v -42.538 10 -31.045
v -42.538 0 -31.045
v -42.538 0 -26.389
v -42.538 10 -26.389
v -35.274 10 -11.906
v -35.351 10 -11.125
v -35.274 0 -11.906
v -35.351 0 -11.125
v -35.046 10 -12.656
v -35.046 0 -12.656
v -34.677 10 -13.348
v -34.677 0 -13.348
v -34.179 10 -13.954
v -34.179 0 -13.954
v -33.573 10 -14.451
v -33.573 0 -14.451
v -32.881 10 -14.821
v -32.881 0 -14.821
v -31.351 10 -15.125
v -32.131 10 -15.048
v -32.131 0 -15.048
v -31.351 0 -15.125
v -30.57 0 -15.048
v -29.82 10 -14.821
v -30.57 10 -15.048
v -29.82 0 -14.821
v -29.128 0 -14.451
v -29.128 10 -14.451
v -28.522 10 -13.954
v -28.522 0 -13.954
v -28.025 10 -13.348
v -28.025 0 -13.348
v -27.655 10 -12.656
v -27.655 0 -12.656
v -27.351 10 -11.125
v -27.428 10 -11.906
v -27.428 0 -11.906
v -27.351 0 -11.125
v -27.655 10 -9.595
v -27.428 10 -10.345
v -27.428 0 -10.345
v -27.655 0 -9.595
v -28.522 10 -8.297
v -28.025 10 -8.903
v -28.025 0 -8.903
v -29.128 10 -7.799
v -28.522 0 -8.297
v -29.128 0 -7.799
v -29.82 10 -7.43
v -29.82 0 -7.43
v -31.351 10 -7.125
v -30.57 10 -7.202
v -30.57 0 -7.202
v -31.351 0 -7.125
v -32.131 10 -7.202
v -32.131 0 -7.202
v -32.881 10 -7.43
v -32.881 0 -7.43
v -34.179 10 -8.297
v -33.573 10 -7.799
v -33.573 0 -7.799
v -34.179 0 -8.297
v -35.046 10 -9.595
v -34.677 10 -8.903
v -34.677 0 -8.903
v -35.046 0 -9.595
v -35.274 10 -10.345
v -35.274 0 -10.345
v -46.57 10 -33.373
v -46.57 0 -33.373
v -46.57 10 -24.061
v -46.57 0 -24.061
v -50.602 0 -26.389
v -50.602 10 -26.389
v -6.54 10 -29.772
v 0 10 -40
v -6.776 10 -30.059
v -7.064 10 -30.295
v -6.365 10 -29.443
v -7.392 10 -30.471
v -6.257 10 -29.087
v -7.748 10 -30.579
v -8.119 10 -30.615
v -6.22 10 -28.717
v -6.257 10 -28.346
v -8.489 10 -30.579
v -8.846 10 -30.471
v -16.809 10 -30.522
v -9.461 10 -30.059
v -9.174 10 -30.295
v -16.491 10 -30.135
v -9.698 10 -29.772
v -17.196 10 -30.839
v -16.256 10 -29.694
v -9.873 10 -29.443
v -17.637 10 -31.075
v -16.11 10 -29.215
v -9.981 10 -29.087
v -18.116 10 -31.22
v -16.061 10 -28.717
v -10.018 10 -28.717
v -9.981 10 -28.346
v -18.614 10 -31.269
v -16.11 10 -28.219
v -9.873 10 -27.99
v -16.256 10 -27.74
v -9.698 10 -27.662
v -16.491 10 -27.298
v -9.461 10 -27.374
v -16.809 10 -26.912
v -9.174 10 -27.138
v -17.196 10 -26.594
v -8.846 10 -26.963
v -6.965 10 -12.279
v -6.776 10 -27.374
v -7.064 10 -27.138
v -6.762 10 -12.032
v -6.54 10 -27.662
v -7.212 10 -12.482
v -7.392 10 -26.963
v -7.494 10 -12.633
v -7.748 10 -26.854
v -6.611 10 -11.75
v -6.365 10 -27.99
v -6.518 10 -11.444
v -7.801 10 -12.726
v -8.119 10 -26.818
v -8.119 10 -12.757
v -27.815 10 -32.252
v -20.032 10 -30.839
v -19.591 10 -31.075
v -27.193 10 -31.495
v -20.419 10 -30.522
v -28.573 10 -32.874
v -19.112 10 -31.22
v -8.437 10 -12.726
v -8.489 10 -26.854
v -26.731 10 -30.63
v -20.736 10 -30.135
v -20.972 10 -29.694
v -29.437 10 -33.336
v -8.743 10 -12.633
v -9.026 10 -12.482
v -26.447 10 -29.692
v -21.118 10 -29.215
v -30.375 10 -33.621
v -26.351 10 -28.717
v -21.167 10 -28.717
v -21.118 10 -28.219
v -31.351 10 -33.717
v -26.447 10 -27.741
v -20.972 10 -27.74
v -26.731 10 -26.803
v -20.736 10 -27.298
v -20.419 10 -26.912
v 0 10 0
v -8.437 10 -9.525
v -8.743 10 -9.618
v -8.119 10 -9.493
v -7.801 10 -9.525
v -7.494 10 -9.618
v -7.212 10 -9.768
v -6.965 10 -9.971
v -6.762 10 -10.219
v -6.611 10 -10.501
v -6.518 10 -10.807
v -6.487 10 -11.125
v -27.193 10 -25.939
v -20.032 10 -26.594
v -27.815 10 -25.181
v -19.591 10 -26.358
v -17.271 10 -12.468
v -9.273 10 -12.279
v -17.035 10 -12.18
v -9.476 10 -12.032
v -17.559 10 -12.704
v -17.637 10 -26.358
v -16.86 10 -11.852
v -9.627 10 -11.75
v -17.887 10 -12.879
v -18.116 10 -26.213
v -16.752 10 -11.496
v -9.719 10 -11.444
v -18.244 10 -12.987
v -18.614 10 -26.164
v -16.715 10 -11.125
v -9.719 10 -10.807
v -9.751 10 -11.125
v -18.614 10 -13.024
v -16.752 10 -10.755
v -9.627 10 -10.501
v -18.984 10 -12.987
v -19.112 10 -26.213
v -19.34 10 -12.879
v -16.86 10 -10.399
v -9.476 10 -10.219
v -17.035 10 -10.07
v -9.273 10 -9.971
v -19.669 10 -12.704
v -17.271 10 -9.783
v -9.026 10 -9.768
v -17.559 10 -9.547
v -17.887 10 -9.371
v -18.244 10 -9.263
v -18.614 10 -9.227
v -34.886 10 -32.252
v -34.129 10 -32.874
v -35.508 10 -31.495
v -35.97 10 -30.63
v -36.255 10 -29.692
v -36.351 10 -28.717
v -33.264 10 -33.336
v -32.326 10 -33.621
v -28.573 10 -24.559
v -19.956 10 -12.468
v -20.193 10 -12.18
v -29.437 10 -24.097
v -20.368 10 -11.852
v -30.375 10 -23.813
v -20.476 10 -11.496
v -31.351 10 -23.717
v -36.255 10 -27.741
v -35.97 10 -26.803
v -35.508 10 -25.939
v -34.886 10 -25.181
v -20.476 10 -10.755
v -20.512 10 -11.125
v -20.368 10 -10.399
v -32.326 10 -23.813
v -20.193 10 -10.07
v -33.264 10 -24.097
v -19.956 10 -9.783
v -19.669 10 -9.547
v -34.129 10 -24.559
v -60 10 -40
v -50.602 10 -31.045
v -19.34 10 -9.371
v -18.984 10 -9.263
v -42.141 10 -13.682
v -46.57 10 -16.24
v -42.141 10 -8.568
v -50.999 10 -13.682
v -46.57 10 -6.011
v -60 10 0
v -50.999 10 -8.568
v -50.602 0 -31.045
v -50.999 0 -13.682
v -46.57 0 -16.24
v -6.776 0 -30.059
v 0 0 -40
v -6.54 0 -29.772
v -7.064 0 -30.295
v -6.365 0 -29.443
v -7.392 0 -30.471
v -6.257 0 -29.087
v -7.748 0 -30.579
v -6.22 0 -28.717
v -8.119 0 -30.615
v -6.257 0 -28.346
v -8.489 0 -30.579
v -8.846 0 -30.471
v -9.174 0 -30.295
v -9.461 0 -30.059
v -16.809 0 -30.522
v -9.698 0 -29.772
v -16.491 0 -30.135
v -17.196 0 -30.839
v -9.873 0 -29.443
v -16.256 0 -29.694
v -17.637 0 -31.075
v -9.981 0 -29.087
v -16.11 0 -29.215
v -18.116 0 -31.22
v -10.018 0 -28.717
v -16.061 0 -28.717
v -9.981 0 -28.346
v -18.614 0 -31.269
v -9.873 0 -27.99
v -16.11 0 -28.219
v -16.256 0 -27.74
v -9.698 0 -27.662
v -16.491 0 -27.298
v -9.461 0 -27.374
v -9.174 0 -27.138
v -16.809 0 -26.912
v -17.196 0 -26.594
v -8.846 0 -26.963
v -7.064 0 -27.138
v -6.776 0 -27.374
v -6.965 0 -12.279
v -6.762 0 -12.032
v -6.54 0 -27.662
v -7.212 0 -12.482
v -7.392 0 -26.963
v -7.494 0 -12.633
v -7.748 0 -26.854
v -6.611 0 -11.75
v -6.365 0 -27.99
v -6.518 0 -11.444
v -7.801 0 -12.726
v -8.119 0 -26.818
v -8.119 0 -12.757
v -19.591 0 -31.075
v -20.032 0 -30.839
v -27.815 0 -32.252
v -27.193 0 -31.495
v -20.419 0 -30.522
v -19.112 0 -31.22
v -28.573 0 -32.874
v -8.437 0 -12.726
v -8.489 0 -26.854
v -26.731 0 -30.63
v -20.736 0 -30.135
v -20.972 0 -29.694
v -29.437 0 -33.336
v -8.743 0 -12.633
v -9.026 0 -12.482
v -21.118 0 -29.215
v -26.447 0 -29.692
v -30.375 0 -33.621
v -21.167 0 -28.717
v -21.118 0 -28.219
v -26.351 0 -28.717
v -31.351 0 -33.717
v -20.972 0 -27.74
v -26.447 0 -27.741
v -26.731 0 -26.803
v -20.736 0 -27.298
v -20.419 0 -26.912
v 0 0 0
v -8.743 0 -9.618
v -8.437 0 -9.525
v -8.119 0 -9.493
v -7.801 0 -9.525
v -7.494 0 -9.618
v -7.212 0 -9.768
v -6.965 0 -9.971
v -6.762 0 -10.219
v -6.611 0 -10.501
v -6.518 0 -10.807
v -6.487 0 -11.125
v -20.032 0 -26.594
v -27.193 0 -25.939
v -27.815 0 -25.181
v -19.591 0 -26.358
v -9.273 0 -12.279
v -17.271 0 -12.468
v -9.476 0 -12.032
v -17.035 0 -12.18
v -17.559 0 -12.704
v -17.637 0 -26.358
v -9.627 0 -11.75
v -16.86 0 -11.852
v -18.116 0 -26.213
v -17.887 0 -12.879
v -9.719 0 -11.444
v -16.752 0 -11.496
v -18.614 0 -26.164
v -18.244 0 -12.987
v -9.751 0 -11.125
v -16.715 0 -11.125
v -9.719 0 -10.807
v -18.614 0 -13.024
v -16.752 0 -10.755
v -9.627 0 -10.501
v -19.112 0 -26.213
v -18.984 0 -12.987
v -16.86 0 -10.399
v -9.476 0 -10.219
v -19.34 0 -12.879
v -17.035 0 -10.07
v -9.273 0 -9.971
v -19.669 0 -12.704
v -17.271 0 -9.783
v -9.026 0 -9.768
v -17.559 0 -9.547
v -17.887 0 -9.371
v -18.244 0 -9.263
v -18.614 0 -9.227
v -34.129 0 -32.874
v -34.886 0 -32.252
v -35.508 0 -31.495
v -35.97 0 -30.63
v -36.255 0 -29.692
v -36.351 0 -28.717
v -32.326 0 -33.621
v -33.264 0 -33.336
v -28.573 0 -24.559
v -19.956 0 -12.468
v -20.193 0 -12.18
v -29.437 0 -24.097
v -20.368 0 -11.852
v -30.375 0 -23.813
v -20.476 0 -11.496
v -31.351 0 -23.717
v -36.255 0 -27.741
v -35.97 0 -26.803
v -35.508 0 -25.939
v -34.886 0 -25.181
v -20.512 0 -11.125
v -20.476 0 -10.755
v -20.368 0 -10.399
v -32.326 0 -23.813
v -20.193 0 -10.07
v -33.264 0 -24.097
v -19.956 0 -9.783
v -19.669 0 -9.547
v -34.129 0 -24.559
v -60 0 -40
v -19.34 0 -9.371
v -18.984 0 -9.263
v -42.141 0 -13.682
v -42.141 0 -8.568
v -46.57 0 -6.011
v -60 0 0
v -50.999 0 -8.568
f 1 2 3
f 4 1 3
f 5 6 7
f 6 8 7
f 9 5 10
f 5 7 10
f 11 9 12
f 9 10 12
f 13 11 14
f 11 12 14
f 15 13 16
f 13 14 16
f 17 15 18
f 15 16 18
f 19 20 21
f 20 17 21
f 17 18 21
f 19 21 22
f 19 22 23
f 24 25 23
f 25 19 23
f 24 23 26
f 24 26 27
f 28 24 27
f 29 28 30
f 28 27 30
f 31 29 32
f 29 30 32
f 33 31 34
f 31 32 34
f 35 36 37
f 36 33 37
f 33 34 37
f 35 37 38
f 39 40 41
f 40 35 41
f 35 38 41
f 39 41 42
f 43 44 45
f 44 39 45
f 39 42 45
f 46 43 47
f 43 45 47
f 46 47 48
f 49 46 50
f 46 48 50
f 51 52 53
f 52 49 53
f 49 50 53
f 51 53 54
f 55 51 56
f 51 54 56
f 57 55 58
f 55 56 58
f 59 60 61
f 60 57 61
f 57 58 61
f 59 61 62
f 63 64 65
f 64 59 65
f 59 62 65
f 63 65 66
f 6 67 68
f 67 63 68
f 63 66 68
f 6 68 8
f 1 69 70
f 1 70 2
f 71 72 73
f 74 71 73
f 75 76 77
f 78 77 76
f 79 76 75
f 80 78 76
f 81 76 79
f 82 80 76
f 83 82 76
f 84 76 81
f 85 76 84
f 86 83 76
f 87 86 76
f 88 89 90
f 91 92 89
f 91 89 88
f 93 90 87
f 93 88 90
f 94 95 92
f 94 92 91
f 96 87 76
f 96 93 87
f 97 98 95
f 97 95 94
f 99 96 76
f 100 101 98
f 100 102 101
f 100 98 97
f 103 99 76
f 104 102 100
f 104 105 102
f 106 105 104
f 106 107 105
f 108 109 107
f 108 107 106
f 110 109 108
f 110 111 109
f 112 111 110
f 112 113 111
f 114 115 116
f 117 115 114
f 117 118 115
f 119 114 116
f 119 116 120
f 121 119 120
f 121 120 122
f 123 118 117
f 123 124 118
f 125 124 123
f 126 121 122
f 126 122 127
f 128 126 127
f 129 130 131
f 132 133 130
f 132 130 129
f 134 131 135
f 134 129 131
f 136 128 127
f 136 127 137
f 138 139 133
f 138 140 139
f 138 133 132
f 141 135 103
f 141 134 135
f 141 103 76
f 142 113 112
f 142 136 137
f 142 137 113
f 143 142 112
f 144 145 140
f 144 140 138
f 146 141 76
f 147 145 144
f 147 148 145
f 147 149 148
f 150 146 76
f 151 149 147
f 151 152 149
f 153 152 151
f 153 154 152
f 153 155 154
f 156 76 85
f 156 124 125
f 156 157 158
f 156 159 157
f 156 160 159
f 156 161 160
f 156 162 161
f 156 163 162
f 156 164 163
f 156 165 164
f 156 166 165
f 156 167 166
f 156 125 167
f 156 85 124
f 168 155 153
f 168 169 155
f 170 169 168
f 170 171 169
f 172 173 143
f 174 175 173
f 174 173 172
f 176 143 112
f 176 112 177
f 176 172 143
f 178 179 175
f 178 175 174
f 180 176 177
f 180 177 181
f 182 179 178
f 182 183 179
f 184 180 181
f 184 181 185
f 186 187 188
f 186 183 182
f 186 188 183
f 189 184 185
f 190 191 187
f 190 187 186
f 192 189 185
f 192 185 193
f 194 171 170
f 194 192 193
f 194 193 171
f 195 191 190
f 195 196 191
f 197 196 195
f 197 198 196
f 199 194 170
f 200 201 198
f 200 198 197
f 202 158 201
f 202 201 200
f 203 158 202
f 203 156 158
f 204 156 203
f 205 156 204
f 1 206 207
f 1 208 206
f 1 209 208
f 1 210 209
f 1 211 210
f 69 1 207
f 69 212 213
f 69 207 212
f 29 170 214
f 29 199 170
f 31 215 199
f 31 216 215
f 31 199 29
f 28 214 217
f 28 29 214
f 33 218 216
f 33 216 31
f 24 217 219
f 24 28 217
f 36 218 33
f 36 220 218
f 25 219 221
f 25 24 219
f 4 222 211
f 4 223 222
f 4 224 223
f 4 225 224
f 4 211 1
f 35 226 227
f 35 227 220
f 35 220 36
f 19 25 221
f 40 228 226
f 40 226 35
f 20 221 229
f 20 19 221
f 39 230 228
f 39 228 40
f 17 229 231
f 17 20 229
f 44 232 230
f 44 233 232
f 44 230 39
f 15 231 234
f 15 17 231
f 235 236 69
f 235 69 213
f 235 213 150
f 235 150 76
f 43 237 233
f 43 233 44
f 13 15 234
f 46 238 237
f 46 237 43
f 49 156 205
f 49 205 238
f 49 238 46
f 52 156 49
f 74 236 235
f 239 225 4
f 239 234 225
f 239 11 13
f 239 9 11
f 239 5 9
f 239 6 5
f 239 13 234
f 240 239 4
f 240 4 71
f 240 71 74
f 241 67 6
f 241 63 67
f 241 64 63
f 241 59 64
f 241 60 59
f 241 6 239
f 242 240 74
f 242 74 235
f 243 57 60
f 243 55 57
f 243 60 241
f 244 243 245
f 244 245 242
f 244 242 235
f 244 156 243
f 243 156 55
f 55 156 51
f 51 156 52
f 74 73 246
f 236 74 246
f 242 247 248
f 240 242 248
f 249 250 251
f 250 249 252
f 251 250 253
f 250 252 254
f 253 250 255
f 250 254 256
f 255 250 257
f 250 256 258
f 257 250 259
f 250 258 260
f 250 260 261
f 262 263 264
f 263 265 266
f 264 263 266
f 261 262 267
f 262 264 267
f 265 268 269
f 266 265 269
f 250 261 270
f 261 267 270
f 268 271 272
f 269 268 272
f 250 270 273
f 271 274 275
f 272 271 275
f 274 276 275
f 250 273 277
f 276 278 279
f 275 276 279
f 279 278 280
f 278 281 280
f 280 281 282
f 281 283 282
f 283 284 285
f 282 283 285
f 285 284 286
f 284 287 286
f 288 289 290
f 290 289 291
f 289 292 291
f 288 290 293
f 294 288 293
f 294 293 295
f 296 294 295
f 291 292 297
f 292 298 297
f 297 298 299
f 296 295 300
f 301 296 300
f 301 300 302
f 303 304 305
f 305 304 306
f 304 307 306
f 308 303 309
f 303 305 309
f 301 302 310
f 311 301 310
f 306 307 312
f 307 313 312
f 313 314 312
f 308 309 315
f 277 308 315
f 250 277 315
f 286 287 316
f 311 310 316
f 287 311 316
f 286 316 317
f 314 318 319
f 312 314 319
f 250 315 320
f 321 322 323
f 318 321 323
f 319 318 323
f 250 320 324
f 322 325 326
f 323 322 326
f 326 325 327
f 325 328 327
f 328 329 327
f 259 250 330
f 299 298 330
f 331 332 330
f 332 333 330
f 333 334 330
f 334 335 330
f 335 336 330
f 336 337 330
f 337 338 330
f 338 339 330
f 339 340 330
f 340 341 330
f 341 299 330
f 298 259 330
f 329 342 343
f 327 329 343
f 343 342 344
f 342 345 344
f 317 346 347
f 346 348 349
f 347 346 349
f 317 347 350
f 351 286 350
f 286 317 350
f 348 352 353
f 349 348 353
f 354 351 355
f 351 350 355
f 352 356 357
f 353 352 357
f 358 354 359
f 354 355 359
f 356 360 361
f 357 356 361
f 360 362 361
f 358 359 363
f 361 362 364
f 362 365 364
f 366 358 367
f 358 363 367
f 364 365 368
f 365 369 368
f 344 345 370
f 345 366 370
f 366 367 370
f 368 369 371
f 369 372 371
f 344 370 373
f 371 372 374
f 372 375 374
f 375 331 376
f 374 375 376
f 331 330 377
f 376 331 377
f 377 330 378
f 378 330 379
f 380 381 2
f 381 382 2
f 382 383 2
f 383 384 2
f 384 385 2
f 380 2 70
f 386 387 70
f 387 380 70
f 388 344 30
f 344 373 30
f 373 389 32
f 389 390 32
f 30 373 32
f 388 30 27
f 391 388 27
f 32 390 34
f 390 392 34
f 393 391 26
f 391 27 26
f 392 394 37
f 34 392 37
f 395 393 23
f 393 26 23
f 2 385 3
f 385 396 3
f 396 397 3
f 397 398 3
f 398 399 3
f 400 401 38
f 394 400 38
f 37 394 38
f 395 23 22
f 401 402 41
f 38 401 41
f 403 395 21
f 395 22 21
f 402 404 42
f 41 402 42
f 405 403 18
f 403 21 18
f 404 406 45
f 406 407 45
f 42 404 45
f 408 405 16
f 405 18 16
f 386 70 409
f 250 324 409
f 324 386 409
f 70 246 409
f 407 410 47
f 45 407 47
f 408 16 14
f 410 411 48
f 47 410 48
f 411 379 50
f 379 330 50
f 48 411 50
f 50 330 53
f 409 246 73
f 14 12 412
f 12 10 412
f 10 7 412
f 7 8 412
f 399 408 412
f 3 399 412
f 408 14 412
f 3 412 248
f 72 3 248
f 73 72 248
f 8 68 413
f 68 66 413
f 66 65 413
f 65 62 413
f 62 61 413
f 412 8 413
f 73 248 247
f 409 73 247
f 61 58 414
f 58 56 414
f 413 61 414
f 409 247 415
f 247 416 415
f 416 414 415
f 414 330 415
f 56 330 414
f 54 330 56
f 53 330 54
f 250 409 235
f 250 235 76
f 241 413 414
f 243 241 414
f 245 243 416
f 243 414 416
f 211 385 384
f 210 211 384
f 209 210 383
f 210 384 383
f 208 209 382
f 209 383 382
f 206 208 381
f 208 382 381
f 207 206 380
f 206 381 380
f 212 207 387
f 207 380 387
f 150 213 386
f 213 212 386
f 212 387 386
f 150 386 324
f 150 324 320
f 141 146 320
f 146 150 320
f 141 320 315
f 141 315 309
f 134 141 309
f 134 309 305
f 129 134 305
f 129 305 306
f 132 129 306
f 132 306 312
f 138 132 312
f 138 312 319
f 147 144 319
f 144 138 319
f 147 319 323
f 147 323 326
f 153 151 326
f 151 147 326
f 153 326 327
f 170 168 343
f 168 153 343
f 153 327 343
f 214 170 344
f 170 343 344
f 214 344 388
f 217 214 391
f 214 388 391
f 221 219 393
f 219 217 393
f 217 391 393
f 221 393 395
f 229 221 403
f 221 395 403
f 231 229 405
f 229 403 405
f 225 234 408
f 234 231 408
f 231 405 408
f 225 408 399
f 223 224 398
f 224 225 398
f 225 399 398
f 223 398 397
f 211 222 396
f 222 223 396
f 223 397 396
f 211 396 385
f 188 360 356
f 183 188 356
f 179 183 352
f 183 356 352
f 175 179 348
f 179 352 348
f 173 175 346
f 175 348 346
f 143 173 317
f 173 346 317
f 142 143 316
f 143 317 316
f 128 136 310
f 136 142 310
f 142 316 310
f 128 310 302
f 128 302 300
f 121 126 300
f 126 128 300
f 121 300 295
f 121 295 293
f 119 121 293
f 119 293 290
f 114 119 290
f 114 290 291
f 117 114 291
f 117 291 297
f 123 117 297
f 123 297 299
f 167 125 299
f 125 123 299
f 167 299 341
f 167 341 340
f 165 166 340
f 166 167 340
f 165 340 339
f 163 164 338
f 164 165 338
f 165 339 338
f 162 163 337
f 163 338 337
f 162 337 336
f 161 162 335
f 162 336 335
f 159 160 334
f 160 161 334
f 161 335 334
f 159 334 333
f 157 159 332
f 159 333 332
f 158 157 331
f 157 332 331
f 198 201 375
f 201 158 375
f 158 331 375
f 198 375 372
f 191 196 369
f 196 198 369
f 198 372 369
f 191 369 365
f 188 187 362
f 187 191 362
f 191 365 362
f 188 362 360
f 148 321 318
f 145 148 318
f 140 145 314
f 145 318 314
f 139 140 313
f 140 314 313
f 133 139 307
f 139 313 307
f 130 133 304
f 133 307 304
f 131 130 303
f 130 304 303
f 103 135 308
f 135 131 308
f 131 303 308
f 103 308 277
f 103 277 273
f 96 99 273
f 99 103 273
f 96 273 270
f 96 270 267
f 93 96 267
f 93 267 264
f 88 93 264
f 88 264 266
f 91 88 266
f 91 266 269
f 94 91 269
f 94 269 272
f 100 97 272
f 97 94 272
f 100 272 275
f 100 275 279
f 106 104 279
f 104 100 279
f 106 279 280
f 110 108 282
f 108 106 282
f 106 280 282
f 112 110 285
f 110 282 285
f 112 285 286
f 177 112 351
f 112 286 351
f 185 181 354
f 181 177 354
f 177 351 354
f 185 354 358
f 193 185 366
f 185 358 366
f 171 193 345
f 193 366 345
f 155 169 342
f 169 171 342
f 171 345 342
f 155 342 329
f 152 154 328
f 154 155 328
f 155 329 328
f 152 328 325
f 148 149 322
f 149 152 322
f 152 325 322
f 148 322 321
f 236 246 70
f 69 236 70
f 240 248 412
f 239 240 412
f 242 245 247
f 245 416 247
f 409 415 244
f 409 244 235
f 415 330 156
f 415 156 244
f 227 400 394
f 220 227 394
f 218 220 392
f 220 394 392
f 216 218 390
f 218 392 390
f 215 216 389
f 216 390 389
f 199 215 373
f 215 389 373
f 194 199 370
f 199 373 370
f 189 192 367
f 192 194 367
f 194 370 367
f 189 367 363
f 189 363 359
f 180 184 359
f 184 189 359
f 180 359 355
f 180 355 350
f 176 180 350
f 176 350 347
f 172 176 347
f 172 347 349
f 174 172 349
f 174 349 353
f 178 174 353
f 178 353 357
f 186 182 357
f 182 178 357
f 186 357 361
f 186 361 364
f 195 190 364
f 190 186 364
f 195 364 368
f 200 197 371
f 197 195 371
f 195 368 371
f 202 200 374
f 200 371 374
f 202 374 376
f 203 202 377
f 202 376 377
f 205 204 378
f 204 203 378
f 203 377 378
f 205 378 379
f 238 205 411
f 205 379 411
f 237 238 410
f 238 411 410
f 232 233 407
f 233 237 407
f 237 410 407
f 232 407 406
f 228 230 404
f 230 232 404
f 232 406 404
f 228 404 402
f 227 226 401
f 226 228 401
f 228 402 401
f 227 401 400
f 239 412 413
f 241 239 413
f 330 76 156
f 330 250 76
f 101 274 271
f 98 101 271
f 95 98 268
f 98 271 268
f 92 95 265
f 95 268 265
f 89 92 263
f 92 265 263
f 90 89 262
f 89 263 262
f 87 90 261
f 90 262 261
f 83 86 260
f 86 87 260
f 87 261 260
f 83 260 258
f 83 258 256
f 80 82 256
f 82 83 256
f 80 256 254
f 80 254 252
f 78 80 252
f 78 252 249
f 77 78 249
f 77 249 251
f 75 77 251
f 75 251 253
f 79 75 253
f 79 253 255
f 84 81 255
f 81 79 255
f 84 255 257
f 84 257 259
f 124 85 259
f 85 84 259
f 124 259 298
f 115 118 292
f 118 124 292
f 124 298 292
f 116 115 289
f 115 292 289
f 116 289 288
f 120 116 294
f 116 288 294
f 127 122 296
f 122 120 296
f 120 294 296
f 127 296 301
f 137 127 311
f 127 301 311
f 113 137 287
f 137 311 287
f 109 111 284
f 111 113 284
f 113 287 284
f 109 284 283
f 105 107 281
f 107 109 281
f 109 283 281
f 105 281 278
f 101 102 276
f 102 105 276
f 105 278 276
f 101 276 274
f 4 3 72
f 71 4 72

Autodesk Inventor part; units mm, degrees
ref_plane "YZ Plane" through (0, 0, 0) normal (1, 0, 0) x (0, 1, 0)
ref_plane "XZ Plane" through (0, 0, 0) normal (0, 1, 0) x (-1, 0, 0)
ref_plane "XY Plane" through (0, 0, 0) normal (0, 0, 1) x (1, 0, 0)
sketch "Sketch1" plane through (0, 0, 0) normal (0, 1, 0) x (-1, 0, 0)
  line L0 (0, 0) -> (60, 0)
  line L1 (60, 0) -> (60, -40)
  line L2 (60, -40) -> (0, -40)
  line L3 (0, -40) -> (0, 0)
  line L4 (50.9991, -13.6825) -> (46.57, -16.2397)
  line L5 (46.57, -16.2397) -> (42.1408, -13.6825)
  line L6 (42.1408, -13.6825) -> (42.1408, -8.5682)
  line L7 (42.1408, -8.5682) -> (46.57, -6.011)
  line L8 (46.57, -6.011) -> (50.9991, -8.5682)
  line L9 (50.9991, -8.5682) -> (50.9991, -13.6825)
  line L10 (50.6022, -31.0448) -> (46.57, -33.3728)
  line L11 (46.57, -33.3728) -> (42.5377, -31.0448)
  line L12 (42.5377, -31.0448) -> (42.5377, -26.3887)
  line L13 (42.5377, -26.3887) -> (46.57, -24.0607)
  line L14 (46.57, -24.0607) -> (50.6022, -26.3887)
  line L15 (50.6022, -26.3887) -> (50.6022, -31.0448)
  line L16 (46.57, 0) -> (46.57, -40) construction
  line L17 (60, -11.1253) -> (0, -11.1253) construction
  line L18 (0, -28.7167) -> (60, -28.7167) construction
  line L19 (31.3507, 0) -> (31.3507, -40) construction
  circle A0 centre (31.3507, -11.1253) radius 4
  circle A1 centre (31.3507, -28.7167) radius 5
  line L20 (18.6139, 0) -> (18.6139, -40) construction
  circle A2 centre (18.6139, -11.1253) radius 1.8986
  circle A3 centre (18.6139, -28.7167) radius 2.5527
  line L21 (8.1189, 0) -> (8.1189, -40) construction
  circle A4 centre (8.1189, -11.1253) radius 1.6319
  circle A5 centre (8.1189, -28.7167) radius 1.8987
  point P0 (46.57, -11.1253)
  point P1 (46.57, -28.7167)
  dimension "d0" = 60
  dimension "d1" = 40
  dimension "d2" = 8.8582
  dimension "d3" = 8.0645
  dimension "d4" = 8
  dimension "d5" = 10
  dimension "d6" = 3.7973
  dimension "d7" = 5.1054
  dimension "d8" = 3.2639
  dimension "d9" = 3.7973
  dimension "d23" = 9.3121
  dimension "d24" = 10.2286
extrude "Extrusion1" add sketch "Sketch1" along normal blind 10
properties part number "DimensionalCalibration"
